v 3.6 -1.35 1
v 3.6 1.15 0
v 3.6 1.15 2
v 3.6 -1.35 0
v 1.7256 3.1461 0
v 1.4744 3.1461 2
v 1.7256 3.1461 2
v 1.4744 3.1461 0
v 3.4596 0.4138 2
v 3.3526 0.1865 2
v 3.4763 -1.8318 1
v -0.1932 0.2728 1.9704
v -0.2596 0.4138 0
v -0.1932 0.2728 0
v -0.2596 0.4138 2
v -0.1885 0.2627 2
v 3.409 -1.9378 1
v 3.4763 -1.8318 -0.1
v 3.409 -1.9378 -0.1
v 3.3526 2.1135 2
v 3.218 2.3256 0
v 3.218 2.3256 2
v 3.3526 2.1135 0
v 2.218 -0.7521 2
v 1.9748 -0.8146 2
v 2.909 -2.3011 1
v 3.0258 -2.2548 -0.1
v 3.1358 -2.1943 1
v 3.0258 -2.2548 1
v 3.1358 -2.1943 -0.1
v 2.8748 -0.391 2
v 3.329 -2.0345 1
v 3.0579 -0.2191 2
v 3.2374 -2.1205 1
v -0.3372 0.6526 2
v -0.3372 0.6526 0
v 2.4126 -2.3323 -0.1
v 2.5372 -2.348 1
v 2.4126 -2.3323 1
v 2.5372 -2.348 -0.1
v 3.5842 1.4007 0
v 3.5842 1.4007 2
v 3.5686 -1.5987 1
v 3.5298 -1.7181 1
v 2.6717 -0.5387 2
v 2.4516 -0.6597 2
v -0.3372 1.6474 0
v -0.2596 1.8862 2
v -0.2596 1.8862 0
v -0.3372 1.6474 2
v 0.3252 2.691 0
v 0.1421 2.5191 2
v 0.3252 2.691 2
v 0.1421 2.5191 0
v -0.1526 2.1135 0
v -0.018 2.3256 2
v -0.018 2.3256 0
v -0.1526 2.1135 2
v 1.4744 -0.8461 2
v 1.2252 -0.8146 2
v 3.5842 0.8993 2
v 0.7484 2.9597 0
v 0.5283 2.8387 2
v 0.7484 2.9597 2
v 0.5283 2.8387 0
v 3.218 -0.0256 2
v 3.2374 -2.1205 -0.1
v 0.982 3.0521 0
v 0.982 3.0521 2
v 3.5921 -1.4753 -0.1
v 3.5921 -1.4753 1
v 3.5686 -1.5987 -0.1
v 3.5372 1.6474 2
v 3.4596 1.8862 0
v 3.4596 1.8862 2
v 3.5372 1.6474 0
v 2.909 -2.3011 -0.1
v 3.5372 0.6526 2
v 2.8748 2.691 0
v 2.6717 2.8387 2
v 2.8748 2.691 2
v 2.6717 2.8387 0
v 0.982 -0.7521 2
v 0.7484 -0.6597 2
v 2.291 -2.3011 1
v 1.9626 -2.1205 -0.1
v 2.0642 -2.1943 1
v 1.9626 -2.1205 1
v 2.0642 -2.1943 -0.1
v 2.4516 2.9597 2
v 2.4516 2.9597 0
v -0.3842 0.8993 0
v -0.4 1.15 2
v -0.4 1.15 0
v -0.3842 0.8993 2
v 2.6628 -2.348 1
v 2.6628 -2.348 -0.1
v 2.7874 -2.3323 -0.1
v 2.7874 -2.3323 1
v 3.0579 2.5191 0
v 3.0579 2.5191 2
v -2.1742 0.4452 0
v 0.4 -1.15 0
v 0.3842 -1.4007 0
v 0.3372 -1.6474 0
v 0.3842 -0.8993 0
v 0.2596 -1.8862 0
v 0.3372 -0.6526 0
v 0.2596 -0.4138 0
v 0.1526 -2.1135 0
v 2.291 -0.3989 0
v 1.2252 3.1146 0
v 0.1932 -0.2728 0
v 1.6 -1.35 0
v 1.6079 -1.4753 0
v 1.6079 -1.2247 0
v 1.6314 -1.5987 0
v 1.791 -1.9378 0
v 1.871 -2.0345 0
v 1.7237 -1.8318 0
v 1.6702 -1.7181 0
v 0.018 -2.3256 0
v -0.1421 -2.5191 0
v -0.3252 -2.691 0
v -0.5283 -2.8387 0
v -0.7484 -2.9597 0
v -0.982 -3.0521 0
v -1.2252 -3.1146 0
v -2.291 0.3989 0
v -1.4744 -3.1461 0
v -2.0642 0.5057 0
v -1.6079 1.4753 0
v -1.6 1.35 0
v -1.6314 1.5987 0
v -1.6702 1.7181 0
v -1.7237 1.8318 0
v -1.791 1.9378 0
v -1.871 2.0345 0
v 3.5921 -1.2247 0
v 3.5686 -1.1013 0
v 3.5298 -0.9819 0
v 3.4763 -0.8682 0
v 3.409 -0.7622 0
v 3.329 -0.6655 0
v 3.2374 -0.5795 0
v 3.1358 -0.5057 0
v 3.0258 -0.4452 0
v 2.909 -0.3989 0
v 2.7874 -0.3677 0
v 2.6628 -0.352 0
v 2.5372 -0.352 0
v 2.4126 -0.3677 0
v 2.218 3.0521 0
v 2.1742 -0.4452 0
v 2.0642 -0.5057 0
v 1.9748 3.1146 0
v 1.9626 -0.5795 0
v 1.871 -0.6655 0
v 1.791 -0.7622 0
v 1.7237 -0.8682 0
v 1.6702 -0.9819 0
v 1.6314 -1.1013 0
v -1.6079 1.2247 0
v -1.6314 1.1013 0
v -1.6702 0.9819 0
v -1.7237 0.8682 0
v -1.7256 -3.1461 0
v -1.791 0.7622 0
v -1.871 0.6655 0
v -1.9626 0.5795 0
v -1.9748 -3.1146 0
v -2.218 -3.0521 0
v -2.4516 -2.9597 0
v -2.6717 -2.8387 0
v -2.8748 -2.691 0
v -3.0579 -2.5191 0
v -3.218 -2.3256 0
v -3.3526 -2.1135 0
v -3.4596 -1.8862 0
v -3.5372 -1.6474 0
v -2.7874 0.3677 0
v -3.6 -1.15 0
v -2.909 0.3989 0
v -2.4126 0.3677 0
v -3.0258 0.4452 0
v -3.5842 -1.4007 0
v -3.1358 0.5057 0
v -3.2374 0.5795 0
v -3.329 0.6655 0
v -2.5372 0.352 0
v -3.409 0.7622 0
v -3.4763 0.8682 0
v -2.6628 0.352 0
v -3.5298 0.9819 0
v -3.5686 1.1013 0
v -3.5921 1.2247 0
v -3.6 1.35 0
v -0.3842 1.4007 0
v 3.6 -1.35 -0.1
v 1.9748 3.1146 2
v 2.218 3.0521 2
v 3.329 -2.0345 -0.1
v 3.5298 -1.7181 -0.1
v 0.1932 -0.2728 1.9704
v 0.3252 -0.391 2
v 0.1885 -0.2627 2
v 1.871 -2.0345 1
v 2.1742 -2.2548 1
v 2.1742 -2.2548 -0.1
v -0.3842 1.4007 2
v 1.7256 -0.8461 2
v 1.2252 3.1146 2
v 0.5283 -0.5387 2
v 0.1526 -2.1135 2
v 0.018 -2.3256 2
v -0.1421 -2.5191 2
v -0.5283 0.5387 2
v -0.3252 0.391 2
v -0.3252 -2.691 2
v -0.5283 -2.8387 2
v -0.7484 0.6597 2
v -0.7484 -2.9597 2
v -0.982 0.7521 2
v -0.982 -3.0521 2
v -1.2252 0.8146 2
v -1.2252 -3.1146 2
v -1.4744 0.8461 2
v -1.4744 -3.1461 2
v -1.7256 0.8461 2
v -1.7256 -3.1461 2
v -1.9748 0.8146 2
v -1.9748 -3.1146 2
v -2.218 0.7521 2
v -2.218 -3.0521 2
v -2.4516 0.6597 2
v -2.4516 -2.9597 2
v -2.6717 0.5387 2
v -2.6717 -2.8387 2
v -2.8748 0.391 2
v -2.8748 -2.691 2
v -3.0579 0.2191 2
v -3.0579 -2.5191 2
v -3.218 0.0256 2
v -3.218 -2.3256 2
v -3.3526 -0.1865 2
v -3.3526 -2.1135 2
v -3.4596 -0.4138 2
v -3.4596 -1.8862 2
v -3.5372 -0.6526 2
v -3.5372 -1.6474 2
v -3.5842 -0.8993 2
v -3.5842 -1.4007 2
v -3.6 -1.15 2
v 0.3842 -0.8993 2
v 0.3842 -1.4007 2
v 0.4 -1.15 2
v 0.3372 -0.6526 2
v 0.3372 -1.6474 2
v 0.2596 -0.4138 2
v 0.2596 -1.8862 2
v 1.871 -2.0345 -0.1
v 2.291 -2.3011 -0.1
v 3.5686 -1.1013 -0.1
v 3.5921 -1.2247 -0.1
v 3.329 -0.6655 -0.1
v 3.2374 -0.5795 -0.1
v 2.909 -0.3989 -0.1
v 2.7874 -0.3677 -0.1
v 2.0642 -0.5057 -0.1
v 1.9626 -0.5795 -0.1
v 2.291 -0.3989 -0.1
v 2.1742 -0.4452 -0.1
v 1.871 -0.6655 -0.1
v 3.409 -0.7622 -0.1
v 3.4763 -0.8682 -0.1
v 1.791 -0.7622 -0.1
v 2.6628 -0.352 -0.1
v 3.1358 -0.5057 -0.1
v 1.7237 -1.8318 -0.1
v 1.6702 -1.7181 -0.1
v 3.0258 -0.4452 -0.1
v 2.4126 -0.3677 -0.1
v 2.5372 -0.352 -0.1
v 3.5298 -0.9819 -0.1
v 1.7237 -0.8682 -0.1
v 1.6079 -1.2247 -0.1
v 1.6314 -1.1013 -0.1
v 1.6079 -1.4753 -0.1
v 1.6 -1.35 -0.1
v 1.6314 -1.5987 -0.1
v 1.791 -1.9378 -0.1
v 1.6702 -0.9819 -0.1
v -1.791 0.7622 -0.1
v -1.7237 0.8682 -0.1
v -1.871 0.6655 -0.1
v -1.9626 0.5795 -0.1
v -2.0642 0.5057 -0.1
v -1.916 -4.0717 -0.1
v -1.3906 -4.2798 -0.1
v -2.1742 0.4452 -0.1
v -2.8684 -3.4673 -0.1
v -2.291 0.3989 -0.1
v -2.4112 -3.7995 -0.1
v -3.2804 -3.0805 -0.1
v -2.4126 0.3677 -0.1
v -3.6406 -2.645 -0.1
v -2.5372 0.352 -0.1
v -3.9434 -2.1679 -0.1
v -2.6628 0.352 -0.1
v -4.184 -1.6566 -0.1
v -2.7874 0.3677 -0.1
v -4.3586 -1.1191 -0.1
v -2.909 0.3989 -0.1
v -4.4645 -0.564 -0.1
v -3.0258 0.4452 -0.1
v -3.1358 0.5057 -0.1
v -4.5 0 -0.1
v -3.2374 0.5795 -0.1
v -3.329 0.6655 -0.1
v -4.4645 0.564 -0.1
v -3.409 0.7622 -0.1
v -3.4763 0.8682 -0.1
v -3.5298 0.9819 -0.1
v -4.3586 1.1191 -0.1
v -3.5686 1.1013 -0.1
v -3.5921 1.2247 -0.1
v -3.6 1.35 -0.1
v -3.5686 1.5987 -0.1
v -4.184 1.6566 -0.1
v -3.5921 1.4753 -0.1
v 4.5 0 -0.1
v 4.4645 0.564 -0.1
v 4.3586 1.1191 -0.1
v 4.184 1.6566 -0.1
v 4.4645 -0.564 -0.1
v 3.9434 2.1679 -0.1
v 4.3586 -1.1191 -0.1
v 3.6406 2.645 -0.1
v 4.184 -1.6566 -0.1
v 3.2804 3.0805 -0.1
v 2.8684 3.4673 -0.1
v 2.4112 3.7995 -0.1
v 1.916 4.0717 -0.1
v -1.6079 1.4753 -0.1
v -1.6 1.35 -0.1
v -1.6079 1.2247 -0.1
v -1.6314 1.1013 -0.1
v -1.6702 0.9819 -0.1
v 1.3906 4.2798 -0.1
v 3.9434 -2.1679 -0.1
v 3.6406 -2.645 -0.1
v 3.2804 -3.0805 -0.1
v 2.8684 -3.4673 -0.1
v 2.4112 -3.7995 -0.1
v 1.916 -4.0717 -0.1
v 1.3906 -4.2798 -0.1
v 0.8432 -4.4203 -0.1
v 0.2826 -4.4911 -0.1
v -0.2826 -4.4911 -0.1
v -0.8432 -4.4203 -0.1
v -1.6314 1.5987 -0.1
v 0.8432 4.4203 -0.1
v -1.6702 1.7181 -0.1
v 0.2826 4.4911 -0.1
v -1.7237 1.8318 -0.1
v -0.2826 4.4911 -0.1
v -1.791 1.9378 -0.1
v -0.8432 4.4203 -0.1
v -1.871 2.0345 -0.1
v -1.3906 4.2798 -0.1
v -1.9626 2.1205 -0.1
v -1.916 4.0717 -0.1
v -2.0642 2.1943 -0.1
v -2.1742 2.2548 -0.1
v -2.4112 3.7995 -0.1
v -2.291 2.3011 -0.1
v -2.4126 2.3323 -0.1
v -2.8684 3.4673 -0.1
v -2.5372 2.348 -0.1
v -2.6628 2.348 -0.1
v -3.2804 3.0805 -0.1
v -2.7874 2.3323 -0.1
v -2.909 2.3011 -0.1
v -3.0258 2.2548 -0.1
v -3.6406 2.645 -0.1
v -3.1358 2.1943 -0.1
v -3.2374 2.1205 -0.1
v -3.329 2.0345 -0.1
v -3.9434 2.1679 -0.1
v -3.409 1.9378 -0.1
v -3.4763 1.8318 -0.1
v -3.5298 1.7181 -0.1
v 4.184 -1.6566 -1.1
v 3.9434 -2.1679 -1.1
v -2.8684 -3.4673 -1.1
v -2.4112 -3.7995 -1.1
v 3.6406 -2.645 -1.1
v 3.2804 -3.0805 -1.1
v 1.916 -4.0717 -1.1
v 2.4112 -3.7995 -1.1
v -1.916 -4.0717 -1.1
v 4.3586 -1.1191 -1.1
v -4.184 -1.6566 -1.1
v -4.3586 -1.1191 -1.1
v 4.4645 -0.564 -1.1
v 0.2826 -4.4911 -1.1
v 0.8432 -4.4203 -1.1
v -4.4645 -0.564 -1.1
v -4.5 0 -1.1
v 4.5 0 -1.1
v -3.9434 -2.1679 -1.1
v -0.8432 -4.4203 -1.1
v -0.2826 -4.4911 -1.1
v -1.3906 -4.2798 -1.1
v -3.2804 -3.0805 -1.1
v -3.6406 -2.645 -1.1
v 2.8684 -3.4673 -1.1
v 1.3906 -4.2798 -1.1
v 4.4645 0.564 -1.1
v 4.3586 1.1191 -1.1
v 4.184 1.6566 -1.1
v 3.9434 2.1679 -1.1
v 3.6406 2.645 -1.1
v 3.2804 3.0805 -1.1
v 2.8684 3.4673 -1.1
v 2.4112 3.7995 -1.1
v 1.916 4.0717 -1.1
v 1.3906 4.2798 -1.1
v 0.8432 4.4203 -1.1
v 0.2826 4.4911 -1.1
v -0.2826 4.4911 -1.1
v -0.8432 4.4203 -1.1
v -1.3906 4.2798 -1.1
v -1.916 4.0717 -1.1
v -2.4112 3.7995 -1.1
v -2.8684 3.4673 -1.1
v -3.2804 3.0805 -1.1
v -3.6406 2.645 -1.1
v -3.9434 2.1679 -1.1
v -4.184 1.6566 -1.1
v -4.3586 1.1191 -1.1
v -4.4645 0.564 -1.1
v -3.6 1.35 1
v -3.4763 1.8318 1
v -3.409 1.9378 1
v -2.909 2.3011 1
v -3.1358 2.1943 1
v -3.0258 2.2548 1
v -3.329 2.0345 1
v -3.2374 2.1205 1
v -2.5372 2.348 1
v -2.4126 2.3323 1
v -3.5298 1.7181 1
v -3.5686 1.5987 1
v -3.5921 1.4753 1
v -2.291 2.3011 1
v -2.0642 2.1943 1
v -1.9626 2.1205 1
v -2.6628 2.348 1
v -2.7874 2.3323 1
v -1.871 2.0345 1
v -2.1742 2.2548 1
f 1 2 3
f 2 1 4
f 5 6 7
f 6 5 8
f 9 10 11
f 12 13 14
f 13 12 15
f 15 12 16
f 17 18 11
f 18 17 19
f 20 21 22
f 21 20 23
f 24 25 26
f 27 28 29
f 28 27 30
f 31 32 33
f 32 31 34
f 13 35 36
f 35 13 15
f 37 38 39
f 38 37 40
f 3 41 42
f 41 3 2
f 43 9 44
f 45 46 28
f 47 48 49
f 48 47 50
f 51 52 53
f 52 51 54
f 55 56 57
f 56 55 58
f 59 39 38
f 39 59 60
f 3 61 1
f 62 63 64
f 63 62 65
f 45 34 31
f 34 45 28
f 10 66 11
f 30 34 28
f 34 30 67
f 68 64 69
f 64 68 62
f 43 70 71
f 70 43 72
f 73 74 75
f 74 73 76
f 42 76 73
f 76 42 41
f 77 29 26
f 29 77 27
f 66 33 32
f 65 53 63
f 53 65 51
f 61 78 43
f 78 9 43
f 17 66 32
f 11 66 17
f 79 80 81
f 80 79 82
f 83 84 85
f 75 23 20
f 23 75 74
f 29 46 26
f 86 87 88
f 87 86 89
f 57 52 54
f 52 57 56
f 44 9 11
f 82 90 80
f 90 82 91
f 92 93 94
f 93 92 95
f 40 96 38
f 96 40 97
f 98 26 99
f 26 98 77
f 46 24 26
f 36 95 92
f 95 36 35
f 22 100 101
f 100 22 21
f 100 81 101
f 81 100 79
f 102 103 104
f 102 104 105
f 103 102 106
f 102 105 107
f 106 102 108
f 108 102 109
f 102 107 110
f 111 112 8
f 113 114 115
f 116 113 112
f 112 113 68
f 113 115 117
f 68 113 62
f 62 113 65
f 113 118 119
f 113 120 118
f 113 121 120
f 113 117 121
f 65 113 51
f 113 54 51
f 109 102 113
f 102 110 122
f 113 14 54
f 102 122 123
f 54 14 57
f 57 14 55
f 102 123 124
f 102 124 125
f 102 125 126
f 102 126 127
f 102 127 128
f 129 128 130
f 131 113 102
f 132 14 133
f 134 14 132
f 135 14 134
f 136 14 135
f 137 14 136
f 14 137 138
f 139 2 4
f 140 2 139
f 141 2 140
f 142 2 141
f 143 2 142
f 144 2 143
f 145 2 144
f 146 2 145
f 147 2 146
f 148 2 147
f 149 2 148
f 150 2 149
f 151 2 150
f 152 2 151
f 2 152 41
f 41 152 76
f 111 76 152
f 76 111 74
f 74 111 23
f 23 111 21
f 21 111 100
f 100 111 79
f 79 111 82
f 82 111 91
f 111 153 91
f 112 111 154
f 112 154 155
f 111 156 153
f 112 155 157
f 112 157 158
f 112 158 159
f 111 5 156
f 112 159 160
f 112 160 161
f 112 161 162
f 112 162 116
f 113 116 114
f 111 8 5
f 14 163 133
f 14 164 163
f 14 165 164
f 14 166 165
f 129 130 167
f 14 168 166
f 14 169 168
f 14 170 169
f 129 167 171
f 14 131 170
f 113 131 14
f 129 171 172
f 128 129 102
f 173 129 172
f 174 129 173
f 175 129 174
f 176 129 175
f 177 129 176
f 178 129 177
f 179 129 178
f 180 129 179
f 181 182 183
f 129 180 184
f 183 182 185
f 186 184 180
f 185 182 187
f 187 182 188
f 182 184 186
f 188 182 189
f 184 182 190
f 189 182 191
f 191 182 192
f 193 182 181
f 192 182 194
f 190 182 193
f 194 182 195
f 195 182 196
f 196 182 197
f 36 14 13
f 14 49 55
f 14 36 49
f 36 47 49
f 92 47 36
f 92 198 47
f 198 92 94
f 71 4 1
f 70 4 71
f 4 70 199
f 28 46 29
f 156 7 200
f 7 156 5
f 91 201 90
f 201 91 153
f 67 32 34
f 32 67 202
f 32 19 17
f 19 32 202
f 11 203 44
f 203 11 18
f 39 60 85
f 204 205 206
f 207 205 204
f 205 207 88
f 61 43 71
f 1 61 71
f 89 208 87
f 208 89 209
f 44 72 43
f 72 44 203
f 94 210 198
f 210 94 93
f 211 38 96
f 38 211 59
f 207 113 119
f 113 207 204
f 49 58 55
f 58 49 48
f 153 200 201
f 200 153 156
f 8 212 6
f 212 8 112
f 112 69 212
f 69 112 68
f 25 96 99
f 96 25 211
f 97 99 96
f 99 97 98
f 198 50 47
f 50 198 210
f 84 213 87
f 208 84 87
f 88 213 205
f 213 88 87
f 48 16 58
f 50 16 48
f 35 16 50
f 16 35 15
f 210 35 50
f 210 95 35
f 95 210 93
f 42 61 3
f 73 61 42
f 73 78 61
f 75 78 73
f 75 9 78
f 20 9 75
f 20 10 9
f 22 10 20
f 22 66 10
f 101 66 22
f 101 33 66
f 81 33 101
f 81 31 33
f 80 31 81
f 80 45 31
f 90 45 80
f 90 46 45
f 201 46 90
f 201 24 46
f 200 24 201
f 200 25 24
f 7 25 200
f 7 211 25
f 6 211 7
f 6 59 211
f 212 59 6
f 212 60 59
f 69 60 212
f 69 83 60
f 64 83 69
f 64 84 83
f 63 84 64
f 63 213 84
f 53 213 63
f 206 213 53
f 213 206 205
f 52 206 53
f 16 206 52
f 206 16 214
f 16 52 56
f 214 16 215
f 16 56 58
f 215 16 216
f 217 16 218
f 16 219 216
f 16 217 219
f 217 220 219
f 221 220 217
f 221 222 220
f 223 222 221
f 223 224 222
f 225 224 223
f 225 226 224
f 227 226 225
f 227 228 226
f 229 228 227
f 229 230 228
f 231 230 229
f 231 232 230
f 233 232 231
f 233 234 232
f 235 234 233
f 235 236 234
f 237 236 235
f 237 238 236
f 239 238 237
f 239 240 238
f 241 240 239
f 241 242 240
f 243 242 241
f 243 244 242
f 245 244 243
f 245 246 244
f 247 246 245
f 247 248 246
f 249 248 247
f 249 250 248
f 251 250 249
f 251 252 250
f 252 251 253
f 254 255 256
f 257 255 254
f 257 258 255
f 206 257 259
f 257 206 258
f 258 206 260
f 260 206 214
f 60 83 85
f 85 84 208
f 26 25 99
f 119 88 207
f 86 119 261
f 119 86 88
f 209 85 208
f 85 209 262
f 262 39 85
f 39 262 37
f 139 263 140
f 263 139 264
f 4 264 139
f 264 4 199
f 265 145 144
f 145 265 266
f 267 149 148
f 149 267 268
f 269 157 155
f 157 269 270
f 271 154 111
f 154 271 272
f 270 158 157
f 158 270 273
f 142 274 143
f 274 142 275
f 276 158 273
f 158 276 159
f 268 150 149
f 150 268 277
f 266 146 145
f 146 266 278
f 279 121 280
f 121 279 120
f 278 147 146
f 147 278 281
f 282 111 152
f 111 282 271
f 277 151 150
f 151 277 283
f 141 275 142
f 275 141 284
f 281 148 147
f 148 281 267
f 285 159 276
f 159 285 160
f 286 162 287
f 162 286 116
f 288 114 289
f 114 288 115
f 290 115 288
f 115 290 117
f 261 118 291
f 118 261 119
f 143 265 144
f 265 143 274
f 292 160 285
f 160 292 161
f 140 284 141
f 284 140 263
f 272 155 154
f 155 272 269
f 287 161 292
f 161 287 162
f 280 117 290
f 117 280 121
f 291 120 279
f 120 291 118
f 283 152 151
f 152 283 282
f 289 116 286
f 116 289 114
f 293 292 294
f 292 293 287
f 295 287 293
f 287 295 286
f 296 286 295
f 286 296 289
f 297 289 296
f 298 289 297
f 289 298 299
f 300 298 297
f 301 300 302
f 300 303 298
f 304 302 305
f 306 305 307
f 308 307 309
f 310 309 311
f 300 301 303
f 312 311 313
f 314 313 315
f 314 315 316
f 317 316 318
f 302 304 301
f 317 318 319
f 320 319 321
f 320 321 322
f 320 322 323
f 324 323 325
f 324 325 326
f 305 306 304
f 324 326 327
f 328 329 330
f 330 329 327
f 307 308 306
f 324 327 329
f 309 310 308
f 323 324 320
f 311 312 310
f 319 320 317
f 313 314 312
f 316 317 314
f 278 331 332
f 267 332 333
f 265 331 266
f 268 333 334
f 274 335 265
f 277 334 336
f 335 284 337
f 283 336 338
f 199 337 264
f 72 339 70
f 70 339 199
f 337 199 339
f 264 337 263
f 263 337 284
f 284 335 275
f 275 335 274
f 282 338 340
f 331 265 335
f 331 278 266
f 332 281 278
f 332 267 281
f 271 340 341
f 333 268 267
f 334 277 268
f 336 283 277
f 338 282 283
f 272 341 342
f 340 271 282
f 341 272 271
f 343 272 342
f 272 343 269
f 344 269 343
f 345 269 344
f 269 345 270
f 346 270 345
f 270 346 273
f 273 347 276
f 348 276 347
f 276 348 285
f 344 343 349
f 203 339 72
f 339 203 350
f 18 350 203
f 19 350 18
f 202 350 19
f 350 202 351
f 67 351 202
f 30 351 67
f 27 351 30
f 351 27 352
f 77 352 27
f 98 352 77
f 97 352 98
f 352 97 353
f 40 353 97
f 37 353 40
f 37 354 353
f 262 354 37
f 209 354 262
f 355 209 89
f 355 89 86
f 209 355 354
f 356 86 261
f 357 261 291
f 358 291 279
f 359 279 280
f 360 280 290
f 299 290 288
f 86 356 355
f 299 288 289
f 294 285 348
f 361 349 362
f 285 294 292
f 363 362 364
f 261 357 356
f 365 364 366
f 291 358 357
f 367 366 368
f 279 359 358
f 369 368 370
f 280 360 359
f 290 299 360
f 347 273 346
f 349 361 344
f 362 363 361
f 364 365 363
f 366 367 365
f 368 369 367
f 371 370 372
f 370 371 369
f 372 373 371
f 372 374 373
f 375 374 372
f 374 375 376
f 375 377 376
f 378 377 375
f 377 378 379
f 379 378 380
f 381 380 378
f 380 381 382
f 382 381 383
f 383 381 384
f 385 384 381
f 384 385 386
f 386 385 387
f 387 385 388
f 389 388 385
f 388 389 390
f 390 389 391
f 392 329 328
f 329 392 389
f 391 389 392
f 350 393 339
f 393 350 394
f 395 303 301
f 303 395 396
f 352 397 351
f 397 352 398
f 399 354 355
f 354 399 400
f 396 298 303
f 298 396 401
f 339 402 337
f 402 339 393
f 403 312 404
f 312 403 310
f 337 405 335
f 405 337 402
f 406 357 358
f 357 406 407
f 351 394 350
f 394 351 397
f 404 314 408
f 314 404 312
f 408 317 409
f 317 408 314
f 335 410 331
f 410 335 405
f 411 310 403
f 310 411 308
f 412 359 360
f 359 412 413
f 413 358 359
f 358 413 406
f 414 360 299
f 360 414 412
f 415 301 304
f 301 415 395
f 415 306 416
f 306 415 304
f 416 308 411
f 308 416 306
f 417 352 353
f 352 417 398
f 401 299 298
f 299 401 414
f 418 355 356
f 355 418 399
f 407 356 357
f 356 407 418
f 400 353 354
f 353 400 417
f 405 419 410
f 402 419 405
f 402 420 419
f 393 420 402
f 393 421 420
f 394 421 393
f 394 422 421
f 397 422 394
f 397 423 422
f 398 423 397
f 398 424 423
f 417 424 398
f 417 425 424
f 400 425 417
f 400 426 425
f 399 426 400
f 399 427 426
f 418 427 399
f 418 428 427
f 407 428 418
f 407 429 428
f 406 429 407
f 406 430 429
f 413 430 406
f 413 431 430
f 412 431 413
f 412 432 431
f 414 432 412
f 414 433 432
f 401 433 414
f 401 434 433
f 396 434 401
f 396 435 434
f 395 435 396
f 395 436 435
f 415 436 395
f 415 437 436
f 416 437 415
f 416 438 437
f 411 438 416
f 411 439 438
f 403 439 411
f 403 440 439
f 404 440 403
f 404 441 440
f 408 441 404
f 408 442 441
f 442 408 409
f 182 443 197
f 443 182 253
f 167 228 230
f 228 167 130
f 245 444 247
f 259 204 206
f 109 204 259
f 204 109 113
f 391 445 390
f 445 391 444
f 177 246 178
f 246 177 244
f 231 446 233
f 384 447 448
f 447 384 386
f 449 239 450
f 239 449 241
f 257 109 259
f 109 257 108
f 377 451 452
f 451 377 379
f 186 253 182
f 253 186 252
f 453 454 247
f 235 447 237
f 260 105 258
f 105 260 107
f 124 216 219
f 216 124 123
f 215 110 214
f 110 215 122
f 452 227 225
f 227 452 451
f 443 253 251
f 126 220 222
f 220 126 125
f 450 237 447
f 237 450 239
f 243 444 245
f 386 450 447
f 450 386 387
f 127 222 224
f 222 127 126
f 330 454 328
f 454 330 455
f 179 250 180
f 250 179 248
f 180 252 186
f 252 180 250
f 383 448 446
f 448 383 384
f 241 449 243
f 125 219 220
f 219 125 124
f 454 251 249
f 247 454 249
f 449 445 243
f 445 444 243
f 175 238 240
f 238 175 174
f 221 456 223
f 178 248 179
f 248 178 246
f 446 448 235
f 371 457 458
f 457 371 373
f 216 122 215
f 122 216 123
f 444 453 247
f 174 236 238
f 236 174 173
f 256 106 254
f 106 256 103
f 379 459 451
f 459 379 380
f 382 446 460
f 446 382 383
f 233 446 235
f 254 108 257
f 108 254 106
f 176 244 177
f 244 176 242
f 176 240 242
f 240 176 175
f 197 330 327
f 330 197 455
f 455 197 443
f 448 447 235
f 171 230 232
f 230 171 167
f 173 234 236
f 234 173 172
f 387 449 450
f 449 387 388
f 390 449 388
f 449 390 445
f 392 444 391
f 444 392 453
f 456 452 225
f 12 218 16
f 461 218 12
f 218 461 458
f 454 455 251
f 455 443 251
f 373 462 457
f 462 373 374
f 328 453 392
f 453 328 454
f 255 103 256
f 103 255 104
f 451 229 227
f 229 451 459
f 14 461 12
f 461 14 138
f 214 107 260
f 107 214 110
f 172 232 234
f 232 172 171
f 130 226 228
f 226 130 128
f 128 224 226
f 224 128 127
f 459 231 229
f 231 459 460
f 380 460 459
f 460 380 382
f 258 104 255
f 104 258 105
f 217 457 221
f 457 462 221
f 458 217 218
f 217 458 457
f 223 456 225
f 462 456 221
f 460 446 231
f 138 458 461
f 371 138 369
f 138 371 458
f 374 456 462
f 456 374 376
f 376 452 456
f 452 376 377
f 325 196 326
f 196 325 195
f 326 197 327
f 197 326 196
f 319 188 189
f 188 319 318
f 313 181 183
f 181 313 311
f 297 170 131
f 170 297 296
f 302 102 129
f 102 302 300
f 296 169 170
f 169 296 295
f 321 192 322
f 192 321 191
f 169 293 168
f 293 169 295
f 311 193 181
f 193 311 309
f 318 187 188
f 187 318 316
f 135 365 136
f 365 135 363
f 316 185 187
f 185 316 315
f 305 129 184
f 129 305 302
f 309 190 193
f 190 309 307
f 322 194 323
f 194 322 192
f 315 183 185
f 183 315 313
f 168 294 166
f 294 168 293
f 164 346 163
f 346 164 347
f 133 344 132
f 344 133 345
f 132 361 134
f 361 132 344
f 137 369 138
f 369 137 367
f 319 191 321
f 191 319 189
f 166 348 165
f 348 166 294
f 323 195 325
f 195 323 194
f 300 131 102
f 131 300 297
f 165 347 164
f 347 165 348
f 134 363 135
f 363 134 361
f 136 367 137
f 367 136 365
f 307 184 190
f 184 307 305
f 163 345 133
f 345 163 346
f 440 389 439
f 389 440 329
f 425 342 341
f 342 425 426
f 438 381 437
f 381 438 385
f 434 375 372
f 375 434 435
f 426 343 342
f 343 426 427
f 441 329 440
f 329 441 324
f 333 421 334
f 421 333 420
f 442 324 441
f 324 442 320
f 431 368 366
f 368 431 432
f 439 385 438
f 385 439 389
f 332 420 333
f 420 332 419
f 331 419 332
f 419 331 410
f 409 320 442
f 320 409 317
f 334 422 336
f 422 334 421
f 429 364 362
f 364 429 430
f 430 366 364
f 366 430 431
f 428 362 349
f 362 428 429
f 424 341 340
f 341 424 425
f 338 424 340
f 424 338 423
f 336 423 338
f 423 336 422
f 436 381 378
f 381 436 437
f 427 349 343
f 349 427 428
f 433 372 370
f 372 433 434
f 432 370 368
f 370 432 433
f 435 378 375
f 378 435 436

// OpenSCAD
/*
  author: Christopher O'Brien <obriencj@gmail.com>
  license: GPL v3
*/


module clasp_half($fn=50) {

     // this is the primary positioning translation, tweak this for
     // better clasping action.
     tweak_x = 1.6;
     tweak_y = 1.15;

     union() {
	  translate([tweak_x, tweak_y, 0]) {
	       hull() {
		    // the catch itself
		    cylinder(2, 2, 2);

		    // the connecting slant from the catch to the
		    // anchor
		    translate([1, -2.5, 0]) {
			 cylinder(1, 1, 1);
		    };
	       };
	       // cylinder anchor into back plate
	       translate([1, -2.5, -1]) {
		    cylinder(1, 1, 1);
	       };
	  };

	  // backing plate half-circle
	  translate([0, 0, -1.1]) {
	       intersection() {
		    translate([0, -4, 0])
			 cube([10, 8, 2], center=true);
		    cylinder(2, 4.5, 4.5);
	       };
	  };
     };

}


// For debugging, render a pair of clasp halves, with the second
// highlighted


module dupl_flip() {
     children();
     #rotate([0, 0, 180]) children();
}


dupl_flip() {
     clasp_half();
};


// The end.
